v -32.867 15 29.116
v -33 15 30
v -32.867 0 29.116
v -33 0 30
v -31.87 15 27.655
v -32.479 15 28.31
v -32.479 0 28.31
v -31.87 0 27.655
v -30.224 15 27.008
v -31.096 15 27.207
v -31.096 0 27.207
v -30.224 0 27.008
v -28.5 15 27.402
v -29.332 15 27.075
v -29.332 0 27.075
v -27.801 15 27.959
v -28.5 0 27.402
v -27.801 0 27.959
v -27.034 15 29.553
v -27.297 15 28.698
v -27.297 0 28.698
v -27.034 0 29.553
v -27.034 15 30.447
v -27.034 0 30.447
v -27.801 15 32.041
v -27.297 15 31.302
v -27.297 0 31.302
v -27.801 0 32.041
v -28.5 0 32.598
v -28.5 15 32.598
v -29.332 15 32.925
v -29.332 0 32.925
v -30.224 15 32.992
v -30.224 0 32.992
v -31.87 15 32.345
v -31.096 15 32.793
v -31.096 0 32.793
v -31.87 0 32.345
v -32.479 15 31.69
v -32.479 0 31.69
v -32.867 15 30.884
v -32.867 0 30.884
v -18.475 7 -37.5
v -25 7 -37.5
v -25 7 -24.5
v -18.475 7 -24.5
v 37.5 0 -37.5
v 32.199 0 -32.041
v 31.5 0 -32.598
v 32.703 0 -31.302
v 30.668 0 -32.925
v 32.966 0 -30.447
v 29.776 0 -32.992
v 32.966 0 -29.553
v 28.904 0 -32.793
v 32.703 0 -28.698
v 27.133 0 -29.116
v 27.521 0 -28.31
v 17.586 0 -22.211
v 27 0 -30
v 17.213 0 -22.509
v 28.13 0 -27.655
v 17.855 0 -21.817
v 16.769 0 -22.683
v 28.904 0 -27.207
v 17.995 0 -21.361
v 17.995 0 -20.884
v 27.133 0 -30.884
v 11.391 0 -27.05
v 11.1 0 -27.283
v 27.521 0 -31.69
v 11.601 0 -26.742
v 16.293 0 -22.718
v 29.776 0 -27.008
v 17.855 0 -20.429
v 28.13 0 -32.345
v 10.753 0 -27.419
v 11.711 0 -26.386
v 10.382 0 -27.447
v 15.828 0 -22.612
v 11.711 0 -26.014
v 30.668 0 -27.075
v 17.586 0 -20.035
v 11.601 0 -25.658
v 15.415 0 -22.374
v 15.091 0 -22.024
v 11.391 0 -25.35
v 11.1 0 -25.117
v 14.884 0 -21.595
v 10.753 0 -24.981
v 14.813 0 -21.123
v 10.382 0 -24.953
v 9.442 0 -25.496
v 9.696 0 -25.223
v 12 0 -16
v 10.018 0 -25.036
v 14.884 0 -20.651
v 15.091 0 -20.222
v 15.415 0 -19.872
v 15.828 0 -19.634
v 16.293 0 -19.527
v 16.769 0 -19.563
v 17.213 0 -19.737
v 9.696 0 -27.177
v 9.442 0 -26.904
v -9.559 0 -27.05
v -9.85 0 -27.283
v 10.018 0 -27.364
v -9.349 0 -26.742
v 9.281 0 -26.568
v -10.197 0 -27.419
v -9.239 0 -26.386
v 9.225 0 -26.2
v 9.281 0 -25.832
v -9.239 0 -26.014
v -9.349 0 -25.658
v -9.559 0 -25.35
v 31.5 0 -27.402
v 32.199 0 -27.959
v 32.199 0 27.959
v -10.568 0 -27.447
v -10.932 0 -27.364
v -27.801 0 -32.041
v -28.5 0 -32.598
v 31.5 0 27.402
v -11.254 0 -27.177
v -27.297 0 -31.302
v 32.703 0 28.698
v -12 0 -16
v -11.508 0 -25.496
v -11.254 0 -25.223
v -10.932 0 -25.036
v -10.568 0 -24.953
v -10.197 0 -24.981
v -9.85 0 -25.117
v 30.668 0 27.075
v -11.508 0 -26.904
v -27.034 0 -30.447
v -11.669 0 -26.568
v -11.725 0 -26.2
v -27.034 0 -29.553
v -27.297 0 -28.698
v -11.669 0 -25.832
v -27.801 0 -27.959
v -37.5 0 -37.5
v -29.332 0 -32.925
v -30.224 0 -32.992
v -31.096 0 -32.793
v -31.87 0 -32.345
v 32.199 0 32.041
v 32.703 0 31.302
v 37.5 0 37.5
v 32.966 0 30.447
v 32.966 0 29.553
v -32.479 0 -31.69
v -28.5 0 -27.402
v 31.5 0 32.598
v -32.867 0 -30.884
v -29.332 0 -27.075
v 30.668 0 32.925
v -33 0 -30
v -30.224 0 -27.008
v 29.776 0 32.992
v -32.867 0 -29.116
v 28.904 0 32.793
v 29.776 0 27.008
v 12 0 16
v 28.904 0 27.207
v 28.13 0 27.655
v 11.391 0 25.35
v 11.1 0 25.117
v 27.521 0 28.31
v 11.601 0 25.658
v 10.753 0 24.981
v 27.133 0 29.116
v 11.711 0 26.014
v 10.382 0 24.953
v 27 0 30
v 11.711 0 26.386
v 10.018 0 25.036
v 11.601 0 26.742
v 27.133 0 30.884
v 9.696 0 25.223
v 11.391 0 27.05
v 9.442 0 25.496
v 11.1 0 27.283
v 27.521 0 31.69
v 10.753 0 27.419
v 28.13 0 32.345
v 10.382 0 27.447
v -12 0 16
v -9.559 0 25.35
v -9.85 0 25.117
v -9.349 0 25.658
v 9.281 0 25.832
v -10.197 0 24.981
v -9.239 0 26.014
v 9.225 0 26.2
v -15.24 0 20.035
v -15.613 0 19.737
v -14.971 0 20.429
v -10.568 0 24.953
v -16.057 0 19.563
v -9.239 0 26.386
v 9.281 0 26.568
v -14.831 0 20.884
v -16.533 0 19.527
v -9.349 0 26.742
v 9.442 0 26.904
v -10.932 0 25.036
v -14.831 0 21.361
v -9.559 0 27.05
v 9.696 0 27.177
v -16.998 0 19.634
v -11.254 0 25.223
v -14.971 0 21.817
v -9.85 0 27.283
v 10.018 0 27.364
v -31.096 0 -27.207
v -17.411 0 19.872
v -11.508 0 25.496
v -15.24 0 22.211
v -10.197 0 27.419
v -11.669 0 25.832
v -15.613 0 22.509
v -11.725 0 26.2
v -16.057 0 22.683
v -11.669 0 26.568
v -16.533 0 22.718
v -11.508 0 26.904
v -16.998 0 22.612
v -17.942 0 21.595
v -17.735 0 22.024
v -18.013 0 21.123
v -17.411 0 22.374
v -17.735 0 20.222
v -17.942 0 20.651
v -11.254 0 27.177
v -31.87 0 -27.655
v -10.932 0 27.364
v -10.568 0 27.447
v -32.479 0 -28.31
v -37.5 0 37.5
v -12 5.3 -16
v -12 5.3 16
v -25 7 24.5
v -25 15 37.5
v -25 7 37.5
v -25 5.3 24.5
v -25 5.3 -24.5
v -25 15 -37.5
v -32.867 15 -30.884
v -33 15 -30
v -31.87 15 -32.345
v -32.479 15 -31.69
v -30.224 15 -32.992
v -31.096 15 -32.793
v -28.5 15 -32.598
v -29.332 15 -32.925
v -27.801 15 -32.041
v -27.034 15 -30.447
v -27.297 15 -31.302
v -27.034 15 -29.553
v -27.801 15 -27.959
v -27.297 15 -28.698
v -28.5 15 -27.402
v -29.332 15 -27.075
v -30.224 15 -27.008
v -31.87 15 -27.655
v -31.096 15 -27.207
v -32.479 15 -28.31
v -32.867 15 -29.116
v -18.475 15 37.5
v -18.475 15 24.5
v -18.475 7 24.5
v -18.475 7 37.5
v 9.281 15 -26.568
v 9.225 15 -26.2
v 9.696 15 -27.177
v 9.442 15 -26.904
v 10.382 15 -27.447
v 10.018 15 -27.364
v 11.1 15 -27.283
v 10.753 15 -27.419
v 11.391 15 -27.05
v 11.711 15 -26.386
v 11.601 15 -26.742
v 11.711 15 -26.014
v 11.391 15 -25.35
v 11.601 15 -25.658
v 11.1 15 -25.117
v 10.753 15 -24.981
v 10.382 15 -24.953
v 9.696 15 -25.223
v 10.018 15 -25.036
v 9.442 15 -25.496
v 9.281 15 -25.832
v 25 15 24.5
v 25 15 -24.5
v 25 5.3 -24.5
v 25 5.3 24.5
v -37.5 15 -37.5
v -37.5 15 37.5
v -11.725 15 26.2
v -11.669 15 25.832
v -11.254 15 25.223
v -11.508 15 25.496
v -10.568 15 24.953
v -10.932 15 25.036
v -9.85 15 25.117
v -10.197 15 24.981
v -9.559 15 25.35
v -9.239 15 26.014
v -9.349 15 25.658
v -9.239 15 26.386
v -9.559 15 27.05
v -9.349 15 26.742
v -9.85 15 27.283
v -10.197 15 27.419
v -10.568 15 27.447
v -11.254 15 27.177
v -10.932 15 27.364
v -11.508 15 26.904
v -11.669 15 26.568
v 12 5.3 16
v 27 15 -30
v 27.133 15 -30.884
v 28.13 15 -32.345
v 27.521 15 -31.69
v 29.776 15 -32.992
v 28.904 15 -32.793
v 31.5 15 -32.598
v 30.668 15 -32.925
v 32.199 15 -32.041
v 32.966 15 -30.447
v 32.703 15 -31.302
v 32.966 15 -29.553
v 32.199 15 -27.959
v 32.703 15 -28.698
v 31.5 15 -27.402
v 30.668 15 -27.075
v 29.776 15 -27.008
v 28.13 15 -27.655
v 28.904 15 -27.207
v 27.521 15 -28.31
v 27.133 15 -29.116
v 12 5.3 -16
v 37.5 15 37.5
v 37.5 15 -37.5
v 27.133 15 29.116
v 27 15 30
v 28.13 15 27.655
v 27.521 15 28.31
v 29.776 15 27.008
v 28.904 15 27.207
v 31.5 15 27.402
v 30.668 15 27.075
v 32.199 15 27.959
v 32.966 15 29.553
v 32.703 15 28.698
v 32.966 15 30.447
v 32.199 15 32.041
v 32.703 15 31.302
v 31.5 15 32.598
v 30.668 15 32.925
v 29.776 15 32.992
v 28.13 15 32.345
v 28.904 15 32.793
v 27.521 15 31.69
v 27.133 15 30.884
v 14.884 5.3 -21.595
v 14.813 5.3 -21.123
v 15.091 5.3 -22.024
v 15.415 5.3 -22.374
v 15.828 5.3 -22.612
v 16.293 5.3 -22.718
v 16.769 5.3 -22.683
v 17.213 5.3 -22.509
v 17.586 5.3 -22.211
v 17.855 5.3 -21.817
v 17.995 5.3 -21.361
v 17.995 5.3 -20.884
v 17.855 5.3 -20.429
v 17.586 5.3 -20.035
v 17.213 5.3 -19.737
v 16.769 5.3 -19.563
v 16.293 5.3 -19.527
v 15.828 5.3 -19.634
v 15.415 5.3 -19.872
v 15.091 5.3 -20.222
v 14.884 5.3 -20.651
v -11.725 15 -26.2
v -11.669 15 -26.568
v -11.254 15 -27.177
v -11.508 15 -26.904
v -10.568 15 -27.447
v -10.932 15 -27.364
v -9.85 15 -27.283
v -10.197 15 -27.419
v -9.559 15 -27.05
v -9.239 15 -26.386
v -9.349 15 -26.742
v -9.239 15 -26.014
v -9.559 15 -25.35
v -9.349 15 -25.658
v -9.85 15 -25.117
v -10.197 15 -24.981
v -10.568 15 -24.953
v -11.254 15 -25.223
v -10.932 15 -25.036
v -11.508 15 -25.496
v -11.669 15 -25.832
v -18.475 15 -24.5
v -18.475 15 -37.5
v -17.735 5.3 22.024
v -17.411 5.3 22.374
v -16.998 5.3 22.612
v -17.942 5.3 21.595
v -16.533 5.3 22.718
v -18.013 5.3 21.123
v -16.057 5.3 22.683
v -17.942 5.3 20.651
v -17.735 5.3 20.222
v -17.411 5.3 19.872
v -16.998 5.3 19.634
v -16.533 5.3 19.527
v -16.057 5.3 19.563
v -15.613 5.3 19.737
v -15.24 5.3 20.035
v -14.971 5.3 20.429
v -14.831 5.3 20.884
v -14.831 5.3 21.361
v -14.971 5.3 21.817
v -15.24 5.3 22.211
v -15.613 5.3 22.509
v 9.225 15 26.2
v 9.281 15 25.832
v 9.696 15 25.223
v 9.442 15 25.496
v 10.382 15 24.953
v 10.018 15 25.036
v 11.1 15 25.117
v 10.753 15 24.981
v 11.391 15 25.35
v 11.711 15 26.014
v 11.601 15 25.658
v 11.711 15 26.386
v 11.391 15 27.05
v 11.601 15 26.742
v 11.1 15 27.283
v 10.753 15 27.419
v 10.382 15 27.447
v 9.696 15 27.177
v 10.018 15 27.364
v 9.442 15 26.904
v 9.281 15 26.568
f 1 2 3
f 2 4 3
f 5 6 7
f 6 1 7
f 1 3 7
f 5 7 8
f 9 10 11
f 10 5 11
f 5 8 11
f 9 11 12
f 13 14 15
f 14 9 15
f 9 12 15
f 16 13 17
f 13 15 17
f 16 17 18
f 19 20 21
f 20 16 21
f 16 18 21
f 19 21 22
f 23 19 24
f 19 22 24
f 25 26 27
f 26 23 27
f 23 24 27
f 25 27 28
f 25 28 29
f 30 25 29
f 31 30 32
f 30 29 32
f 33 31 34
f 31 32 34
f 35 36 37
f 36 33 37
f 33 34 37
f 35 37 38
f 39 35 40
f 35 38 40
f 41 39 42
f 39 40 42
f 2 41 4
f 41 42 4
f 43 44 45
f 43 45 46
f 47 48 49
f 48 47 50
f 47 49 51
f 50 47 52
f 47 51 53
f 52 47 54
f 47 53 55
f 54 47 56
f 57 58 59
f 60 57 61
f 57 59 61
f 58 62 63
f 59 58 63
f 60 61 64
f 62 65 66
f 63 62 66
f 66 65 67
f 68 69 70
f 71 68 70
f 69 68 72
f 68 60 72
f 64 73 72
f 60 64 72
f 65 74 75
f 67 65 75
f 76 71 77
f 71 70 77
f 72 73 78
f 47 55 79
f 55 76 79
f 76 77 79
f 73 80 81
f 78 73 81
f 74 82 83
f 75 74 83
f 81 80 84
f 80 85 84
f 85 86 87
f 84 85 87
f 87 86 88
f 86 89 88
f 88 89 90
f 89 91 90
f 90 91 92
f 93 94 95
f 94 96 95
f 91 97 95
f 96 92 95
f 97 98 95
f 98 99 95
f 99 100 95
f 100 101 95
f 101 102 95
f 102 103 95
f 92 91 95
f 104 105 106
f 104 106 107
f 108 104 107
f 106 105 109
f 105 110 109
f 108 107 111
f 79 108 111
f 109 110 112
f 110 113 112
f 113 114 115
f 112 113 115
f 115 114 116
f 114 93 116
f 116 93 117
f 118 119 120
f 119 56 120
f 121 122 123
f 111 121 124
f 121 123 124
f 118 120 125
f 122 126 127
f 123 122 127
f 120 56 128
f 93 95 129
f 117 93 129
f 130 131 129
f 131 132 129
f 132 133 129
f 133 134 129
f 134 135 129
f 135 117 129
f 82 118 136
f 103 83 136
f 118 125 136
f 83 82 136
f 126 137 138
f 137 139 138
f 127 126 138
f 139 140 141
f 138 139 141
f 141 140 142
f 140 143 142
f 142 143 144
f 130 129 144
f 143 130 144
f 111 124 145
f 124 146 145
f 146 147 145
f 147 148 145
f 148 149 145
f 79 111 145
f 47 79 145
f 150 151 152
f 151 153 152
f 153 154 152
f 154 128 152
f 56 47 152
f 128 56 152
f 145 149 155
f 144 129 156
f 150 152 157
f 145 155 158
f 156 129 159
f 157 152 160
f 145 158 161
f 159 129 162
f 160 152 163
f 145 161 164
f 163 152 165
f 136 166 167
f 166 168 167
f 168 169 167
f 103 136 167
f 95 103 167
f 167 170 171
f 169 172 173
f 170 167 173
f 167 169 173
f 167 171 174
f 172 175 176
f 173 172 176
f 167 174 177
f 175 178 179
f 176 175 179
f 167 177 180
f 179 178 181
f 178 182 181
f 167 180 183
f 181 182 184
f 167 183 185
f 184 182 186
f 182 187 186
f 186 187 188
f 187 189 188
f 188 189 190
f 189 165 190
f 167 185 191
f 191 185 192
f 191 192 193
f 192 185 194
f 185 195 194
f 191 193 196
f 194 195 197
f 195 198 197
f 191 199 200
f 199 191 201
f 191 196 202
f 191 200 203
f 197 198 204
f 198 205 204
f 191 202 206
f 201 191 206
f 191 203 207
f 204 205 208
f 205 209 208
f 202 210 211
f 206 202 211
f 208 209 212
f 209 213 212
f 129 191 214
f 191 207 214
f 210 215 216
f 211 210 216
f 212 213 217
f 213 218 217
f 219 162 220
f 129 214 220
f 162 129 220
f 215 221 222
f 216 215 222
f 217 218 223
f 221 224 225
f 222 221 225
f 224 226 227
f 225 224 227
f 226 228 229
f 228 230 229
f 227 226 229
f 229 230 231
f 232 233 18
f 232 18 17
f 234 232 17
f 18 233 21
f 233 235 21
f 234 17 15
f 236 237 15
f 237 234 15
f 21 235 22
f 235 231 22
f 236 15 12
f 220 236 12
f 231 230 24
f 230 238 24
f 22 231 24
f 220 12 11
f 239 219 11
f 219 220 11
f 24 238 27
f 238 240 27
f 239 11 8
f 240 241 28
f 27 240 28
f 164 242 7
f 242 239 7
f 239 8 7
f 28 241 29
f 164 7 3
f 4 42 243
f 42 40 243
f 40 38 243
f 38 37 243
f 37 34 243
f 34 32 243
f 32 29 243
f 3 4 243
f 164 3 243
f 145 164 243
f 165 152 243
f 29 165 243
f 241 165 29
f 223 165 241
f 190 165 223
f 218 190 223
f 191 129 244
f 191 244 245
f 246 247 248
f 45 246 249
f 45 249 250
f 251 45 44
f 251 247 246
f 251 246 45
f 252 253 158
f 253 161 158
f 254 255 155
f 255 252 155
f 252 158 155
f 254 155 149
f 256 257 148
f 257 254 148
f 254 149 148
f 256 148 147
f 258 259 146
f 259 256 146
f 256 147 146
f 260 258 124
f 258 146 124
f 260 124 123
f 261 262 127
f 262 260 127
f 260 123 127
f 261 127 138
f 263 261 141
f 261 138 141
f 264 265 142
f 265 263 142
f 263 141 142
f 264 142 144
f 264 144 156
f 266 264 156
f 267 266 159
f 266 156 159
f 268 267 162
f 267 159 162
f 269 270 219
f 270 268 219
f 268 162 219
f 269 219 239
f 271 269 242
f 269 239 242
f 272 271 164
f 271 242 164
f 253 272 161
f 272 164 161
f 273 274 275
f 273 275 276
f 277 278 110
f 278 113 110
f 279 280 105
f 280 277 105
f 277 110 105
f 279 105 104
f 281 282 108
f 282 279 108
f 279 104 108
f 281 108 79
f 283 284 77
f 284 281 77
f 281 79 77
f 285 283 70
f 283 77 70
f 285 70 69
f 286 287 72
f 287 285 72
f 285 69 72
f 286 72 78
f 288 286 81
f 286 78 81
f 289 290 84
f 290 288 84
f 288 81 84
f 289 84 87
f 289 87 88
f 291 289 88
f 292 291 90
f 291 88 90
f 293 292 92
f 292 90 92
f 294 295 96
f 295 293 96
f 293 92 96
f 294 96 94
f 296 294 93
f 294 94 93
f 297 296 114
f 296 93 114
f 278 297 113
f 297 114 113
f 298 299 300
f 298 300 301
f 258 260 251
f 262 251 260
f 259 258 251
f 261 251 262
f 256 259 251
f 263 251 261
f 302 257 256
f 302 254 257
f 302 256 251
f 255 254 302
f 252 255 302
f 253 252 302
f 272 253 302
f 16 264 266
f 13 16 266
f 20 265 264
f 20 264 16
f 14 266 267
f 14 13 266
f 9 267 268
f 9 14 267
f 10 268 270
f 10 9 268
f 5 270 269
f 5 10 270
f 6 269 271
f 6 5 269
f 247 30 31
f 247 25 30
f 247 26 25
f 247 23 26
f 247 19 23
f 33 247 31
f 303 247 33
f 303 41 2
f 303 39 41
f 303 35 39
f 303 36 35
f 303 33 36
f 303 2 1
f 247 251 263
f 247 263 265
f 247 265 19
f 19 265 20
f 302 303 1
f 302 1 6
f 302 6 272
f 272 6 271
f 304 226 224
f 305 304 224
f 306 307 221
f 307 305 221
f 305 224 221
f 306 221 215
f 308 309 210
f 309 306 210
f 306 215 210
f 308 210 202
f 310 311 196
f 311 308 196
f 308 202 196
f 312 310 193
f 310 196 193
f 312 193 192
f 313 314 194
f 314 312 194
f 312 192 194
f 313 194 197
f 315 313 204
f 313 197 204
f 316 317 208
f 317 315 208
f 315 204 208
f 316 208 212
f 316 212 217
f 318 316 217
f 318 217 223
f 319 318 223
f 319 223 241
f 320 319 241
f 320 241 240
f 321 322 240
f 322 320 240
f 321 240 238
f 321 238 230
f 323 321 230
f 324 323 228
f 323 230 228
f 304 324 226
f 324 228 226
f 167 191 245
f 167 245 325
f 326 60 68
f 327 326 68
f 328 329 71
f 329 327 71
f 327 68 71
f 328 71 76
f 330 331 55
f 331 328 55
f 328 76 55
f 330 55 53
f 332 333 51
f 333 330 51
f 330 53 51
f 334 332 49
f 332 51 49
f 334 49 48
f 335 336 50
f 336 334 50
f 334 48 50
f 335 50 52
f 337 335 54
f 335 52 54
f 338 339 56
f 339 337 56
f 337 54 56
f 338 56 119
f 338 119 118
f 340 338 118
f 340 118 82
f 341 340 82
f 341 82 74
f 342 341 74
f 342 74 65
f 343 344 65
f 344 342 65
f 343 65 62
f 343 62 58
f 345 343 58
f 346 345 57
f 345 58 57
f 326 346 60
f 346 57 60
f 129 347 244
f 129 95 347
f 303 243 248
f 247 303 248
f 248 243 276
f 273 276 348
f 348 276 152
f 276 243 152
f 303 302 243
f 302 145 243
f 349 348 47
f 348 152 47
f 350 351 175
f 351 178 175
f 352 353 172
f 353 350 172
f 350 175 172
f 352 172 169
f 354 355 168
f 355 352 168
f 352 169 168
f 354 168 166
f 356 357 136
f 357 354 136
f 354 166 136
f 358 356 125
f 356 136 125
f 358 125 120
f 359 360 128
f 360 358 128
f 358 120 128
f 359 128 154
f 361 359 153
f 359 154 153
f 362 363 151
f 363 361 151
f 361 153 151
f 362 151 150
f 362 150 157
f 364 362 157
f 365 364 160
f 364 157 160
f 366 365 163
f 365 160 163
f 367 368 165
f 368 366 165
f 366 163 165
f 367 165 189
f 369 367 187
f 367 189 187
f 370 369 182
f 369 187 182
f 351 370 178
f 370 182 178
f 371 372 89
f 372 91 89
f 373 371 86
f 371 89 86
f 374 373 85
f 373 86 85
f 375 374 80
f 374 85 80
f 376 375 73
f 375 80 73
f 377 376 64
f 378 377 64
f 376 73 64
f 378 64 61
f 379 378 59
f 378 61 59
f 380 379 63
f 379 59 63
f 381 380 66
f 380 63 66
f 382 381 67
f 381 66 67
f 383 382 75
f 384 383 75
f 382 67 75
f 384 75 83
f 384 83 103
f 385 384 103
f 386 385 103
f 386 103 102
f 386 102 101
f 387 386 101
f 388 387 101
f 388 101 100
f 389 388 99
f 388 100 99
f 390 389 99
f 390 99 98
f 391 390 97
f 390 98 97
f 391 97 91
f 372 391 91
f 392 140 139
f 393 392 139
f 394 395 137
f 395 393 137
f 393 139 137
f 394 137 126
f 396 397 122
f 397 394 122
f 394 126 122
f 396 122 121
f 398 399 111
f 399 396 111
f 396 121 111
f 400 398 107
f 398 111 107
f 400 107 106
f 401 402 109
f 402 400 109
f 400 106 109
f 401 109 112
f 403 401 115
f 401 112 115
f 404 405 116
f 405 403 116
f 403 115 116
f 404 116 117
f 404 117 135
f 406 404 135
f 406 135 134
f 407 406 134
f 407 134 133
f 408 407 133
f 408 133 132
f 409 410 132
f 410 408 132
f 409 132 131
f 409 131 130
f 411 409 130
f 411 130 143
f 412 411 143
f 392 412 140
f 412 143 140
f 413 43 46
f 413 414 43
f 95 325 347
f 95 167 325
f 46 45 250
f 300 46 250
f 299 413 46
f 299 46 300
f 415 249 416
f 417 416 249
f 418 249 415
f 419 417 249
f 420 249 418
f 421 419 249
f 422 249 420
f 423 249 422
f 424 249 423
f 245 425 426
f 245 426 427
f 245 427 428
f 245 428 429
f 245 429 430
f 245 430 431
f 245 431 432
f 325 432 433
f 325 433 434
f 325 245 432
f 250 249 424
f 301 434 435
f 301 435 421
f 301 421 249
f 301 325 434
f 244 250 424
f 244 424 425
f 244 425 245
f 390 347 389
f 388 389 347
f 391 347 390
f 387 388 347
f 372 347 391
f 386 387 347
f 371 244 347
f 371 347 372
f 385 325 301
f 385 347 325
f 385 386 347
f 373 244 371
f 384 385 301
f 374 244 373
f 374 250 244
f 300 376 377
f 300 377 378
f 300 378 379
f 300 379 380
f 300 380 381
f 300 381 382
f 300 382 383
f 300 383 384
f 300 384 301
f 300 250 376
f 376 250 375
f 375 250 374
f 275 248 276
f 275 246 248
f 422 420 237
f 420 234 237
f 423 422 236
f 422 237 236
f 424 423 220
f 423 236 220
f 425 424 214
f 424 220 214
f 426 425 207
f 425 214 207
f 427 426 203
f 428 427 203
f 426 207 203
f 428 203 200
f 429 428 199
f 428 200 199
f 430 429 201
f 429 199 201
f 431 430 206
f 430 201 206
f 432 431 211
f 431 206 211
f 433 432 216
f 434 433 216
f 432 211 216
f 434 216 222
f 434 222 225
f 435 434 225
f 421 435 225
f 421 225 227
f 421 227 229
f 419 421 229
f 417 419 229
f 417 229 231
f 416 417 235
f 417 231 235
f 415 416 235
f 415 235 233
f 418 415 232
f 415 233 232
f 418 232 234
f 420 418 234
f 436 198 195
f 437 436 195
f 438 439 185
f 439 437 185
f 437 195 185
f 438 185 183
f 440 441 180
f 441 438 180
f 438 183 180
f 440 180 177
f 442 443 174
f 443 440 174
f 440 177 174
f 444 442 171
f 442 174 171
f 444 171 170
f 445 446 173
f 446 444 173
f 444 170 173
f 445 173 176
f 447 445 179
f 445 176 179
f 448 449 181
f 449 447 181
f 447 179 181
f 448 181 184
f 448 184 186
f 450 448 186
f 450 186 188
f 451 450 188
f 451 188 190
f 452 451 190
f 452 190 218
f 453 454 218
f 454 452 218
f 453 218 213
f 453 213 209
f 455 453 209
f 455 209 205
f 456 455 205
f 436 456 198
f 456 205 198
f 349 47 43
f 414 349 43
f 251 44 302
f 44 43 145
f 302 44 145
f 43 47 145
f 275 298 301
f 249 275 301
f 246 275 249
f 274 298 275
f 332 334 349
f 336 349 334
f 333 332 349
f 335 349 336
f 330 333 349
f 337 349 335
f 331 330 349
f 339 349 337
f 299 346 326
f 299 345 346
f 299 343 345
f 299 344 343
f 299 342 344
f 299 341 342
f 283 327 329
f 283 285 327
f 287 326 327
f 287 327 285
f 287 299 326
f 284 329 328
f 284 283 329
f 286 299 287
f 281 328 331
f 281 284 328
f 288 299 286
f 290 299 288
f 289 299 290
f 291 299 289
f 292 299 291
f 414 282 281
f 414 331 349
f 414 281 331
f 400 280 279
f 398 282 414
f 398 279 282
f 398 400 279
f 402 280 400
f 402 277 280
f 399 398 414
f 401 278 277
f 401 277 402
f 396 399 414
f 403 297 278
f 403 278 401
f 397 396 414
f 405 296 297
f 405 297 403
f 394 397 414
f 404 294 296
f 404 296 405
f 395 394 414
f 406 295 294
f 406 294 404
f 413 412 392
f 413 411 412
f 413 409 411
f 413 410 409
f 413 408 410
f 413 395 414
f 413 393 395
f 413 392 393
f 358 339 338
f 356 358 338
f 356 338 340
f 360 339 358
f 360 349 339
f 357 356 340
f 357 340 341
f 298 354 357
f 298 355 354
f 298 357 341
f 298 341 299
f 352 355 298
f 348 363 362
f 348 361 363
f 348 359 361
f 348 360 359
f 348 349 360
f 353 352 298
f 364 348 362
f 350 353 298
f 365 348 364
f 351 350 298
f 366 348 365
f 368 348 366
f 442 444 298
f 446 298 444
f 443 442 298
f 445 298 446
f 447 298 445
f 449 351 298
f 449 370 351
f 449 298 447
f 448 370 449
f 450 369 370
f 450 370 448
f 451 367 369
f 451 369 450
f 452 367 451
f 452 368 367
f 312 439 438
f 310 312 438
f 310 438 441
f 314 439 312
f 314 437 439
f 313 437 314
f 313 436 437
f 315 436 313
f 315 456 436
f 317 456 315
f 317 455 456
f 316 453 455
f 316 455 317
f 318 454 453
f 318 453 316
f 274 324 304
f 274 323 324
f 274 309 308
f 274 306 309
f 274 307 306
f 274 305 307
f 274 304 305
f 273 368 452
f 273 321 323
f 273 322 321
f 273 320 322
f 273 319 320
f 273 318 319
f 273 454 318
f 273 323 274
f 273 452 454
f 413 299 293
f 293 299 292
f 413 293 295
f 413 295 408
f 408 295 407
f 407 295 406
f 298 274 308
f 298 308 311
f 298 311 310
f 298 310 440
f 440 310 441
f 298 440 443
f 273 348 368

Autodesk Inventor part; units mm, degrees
ref_plane "YZ Plane" through (0, 0, 0) normal (1, 0, 0) x (0, 1, 0)
ref_plane "XZ Plane" through (0, 0, 0) normal (0, 1, 0) x (-1, 0, 0)
ref_plane "XY Plane" through (0, 0, 0) normal (0, 0, 1) x (1, 0, 0)
sketch "Baza" plane through (0, 0, 0) normal (0, 1, 0) x (-1, 0, 0)
  line L0 (30, 30) -> (-30, 30) construction
  line L1 (-30, 30) -> (-30, -30) construction
  line L2 (-30, -30) -> (30, -30) construction
  line L3 (30, -30) -> (30, 30) construction
  line L4 (30, 30) -> (-30, -30) construction
  line L5 (-30, 30) -> (30, -30) construction
  circle A0 centre (30, -30) radius 3
  circle A1 centre (30, 30) radius 3
  circle A2 centre (-30, 30) radius 3
  circle A3 centre (-30, -30) radius 3
  line L6 (37.5, 37.5) -> (-37.5, 37.5)
  line L7 (-37.5, 37.5) -> (-37.5, -37.5)
  line L8 (-37.5, -37.5) -> (37.5, -37.5)
  line L9 (37.5, -37.5) -> (37.5, 37.5)
  line L10 (37.5, 37.5) -> (-37.5, -37.5) construction
  line L11 (-37.5, 37.5) -> (37.5, -37.5) construction
  line L12 (10.475, 26.2) -> (-10.475, 26.2) construction
  line L13 (-10.475, 26.2) -> (-10.475, -26.2) construction
  line L14 (-10.475, -26.2) -> (10.475, -26.2) construction
  line L15 (10.475, -26.2) -> (10.475, 26.2) construction
  line L16 (10.475, 26.2) -> (-10.475, -26.2) construction
  line L17 (-10.475, 26.2) -> (10.475, -26.2) construction
  circle A4 centre (10.475, 26.2) radius 1.25
  circle A5 centre (-10.475, 26.2) radius 1.25
  circle A6 centre (-10.475, -26.2) radius 1.25
  circle A7 centre (10.475, -26.2) radius 1.25
  line L18 (12, 16) -> (-12, 16)
  line L19 (-12, 16) -> (-12, -16)
  line L20 (-12, -16) -> (12, -16)
  line L21 (12, -16) -> (12, 16)
  line L22 (12, 16) -> (-12, -16) construction
  line L23 (-12, 16) -> (12, -16) construction
  circle A8 centre (16.413, 21.1229) radius 1.6
  circle A9 centre (-16.413, -21.1229) radius 1.6
  point P0 (0, 0)
  dimension "d0" = 60
  dimension "d1" = 6
  dimension "d2" = 75
  dimension "d3" = 20.95
  dimension "d4" = 52.4
  dimension "d5" = 2.5
  dimension "d6" = 24
  dimension "d7" = 32
  dimension "d12" = 3.2
  dimension "d20" = 5.938
  dimension "d21" = 5.0771
  dimension "d22" = 5.938
  dimension "d23" = 5.0771
extrude "Wyciągnięcie proste1" add sketch "Baza" along normal blind 15
sketch "Szkic2" plane through (0, 15, 0) normal (0, 1, 0) x (1, 0, 0)
  line L0 (37.5, -37.5) -> (37.5, 37.5) projected
  line L1 (37.5, 37.5) -> (-37.5, 37.5) projected
  line L2 (-37.5, 37.5) -> (-37.5, -37.5) projected
  line L3 (-37.5, -37.5) -> (37.5, -37.5) projected
  circle A0 centre (16.413, 21.1229) radius 1.6 projected
  circle A1 centre (-10.475, 26.2) radius 1.25 projected
  circle A2 centre (10.475, 26.2) radius 1.25 projected
  circle A3 centre (10.475, -26.2) radius 1.25 projected
  circle A4 centre (-10.475, -26.2) radius 1.25 projected
  circle A5 centre (30, 30) radius 3 projected
  circle A6 centre (30, -30) radius 3 projected
  circle A7 centre (-30, -30) radius 3 projected
  circle A8 centre (-30, 30) radius 3 projected
  circle A9 centre (-16.413, -21.1229) radius 1.6 projected
  line L4 (-12, -16) -> (-12, 16) projected
  line L5 (-12, 16) -> (12, 16) projected
  line L6 (12, 16) -> (12, -16) projected
  line L7 (12, -16) -> (-12, -16) projected
  line L8 (-12, -16) -> (-12, 16) projected
  point P0 (0, 0)
sketch "Szkic3" plane through (0, 15, 0) normal (0, 1, 0) x (1, 0, 0)
  line L0 (25, -24.5) -> (-25, -24.5)
  line L1 (-25, -24.5) -> (-25, 24.5)
  line L2 (-25, 24.5) -> (25, 24.5)
  line L3 (25, 24.5) -> (25, -24.5)
  line L4 (25, -24.5) -> (-25, 24.5) construction
  line L5 (-25, -24.5) -> (25, 24.5) construction
  point P0 (0, 0)
  dimension "d16" = 49
  dimension "d17" = 50
extrude "Wyciągnięcie proste2" cut sketch "Szkic3" against normal blind 9.7
sketch "Szkic4" plane through (0, 15, 0) normal (0, 1, 0) x (1, 0, 0)
  line L0 (37.5, 37.5) -> (-37.5, 37.5) projected
  line L1 (-37.5, -37.5) -> (37.5, -37.5) projected
  line L2 (-25, 37.5) -> (-18.475, 37.5)
  line L3 (-18.475, 37.5) -> (-18.475, -37.5)
  line L4 (-18.475, -37.5) -> (-25, -37.5)
  line L5 (-25, -37.5) -> (-25, 37.5)
  circle A0 centre (-10.475, 26.2) radius 1.25 projected
  line L6 (-25, -24.5) -> (-25, 24.5) projected
  point P0 (0, 0)
  dimension "d24" = 8
extrude "Wyciągnięcie proste3" cut sketch "Szkic4" against normal blind 8 contours L3 L1 L5 L0
properties part number "dmd_cnc"
